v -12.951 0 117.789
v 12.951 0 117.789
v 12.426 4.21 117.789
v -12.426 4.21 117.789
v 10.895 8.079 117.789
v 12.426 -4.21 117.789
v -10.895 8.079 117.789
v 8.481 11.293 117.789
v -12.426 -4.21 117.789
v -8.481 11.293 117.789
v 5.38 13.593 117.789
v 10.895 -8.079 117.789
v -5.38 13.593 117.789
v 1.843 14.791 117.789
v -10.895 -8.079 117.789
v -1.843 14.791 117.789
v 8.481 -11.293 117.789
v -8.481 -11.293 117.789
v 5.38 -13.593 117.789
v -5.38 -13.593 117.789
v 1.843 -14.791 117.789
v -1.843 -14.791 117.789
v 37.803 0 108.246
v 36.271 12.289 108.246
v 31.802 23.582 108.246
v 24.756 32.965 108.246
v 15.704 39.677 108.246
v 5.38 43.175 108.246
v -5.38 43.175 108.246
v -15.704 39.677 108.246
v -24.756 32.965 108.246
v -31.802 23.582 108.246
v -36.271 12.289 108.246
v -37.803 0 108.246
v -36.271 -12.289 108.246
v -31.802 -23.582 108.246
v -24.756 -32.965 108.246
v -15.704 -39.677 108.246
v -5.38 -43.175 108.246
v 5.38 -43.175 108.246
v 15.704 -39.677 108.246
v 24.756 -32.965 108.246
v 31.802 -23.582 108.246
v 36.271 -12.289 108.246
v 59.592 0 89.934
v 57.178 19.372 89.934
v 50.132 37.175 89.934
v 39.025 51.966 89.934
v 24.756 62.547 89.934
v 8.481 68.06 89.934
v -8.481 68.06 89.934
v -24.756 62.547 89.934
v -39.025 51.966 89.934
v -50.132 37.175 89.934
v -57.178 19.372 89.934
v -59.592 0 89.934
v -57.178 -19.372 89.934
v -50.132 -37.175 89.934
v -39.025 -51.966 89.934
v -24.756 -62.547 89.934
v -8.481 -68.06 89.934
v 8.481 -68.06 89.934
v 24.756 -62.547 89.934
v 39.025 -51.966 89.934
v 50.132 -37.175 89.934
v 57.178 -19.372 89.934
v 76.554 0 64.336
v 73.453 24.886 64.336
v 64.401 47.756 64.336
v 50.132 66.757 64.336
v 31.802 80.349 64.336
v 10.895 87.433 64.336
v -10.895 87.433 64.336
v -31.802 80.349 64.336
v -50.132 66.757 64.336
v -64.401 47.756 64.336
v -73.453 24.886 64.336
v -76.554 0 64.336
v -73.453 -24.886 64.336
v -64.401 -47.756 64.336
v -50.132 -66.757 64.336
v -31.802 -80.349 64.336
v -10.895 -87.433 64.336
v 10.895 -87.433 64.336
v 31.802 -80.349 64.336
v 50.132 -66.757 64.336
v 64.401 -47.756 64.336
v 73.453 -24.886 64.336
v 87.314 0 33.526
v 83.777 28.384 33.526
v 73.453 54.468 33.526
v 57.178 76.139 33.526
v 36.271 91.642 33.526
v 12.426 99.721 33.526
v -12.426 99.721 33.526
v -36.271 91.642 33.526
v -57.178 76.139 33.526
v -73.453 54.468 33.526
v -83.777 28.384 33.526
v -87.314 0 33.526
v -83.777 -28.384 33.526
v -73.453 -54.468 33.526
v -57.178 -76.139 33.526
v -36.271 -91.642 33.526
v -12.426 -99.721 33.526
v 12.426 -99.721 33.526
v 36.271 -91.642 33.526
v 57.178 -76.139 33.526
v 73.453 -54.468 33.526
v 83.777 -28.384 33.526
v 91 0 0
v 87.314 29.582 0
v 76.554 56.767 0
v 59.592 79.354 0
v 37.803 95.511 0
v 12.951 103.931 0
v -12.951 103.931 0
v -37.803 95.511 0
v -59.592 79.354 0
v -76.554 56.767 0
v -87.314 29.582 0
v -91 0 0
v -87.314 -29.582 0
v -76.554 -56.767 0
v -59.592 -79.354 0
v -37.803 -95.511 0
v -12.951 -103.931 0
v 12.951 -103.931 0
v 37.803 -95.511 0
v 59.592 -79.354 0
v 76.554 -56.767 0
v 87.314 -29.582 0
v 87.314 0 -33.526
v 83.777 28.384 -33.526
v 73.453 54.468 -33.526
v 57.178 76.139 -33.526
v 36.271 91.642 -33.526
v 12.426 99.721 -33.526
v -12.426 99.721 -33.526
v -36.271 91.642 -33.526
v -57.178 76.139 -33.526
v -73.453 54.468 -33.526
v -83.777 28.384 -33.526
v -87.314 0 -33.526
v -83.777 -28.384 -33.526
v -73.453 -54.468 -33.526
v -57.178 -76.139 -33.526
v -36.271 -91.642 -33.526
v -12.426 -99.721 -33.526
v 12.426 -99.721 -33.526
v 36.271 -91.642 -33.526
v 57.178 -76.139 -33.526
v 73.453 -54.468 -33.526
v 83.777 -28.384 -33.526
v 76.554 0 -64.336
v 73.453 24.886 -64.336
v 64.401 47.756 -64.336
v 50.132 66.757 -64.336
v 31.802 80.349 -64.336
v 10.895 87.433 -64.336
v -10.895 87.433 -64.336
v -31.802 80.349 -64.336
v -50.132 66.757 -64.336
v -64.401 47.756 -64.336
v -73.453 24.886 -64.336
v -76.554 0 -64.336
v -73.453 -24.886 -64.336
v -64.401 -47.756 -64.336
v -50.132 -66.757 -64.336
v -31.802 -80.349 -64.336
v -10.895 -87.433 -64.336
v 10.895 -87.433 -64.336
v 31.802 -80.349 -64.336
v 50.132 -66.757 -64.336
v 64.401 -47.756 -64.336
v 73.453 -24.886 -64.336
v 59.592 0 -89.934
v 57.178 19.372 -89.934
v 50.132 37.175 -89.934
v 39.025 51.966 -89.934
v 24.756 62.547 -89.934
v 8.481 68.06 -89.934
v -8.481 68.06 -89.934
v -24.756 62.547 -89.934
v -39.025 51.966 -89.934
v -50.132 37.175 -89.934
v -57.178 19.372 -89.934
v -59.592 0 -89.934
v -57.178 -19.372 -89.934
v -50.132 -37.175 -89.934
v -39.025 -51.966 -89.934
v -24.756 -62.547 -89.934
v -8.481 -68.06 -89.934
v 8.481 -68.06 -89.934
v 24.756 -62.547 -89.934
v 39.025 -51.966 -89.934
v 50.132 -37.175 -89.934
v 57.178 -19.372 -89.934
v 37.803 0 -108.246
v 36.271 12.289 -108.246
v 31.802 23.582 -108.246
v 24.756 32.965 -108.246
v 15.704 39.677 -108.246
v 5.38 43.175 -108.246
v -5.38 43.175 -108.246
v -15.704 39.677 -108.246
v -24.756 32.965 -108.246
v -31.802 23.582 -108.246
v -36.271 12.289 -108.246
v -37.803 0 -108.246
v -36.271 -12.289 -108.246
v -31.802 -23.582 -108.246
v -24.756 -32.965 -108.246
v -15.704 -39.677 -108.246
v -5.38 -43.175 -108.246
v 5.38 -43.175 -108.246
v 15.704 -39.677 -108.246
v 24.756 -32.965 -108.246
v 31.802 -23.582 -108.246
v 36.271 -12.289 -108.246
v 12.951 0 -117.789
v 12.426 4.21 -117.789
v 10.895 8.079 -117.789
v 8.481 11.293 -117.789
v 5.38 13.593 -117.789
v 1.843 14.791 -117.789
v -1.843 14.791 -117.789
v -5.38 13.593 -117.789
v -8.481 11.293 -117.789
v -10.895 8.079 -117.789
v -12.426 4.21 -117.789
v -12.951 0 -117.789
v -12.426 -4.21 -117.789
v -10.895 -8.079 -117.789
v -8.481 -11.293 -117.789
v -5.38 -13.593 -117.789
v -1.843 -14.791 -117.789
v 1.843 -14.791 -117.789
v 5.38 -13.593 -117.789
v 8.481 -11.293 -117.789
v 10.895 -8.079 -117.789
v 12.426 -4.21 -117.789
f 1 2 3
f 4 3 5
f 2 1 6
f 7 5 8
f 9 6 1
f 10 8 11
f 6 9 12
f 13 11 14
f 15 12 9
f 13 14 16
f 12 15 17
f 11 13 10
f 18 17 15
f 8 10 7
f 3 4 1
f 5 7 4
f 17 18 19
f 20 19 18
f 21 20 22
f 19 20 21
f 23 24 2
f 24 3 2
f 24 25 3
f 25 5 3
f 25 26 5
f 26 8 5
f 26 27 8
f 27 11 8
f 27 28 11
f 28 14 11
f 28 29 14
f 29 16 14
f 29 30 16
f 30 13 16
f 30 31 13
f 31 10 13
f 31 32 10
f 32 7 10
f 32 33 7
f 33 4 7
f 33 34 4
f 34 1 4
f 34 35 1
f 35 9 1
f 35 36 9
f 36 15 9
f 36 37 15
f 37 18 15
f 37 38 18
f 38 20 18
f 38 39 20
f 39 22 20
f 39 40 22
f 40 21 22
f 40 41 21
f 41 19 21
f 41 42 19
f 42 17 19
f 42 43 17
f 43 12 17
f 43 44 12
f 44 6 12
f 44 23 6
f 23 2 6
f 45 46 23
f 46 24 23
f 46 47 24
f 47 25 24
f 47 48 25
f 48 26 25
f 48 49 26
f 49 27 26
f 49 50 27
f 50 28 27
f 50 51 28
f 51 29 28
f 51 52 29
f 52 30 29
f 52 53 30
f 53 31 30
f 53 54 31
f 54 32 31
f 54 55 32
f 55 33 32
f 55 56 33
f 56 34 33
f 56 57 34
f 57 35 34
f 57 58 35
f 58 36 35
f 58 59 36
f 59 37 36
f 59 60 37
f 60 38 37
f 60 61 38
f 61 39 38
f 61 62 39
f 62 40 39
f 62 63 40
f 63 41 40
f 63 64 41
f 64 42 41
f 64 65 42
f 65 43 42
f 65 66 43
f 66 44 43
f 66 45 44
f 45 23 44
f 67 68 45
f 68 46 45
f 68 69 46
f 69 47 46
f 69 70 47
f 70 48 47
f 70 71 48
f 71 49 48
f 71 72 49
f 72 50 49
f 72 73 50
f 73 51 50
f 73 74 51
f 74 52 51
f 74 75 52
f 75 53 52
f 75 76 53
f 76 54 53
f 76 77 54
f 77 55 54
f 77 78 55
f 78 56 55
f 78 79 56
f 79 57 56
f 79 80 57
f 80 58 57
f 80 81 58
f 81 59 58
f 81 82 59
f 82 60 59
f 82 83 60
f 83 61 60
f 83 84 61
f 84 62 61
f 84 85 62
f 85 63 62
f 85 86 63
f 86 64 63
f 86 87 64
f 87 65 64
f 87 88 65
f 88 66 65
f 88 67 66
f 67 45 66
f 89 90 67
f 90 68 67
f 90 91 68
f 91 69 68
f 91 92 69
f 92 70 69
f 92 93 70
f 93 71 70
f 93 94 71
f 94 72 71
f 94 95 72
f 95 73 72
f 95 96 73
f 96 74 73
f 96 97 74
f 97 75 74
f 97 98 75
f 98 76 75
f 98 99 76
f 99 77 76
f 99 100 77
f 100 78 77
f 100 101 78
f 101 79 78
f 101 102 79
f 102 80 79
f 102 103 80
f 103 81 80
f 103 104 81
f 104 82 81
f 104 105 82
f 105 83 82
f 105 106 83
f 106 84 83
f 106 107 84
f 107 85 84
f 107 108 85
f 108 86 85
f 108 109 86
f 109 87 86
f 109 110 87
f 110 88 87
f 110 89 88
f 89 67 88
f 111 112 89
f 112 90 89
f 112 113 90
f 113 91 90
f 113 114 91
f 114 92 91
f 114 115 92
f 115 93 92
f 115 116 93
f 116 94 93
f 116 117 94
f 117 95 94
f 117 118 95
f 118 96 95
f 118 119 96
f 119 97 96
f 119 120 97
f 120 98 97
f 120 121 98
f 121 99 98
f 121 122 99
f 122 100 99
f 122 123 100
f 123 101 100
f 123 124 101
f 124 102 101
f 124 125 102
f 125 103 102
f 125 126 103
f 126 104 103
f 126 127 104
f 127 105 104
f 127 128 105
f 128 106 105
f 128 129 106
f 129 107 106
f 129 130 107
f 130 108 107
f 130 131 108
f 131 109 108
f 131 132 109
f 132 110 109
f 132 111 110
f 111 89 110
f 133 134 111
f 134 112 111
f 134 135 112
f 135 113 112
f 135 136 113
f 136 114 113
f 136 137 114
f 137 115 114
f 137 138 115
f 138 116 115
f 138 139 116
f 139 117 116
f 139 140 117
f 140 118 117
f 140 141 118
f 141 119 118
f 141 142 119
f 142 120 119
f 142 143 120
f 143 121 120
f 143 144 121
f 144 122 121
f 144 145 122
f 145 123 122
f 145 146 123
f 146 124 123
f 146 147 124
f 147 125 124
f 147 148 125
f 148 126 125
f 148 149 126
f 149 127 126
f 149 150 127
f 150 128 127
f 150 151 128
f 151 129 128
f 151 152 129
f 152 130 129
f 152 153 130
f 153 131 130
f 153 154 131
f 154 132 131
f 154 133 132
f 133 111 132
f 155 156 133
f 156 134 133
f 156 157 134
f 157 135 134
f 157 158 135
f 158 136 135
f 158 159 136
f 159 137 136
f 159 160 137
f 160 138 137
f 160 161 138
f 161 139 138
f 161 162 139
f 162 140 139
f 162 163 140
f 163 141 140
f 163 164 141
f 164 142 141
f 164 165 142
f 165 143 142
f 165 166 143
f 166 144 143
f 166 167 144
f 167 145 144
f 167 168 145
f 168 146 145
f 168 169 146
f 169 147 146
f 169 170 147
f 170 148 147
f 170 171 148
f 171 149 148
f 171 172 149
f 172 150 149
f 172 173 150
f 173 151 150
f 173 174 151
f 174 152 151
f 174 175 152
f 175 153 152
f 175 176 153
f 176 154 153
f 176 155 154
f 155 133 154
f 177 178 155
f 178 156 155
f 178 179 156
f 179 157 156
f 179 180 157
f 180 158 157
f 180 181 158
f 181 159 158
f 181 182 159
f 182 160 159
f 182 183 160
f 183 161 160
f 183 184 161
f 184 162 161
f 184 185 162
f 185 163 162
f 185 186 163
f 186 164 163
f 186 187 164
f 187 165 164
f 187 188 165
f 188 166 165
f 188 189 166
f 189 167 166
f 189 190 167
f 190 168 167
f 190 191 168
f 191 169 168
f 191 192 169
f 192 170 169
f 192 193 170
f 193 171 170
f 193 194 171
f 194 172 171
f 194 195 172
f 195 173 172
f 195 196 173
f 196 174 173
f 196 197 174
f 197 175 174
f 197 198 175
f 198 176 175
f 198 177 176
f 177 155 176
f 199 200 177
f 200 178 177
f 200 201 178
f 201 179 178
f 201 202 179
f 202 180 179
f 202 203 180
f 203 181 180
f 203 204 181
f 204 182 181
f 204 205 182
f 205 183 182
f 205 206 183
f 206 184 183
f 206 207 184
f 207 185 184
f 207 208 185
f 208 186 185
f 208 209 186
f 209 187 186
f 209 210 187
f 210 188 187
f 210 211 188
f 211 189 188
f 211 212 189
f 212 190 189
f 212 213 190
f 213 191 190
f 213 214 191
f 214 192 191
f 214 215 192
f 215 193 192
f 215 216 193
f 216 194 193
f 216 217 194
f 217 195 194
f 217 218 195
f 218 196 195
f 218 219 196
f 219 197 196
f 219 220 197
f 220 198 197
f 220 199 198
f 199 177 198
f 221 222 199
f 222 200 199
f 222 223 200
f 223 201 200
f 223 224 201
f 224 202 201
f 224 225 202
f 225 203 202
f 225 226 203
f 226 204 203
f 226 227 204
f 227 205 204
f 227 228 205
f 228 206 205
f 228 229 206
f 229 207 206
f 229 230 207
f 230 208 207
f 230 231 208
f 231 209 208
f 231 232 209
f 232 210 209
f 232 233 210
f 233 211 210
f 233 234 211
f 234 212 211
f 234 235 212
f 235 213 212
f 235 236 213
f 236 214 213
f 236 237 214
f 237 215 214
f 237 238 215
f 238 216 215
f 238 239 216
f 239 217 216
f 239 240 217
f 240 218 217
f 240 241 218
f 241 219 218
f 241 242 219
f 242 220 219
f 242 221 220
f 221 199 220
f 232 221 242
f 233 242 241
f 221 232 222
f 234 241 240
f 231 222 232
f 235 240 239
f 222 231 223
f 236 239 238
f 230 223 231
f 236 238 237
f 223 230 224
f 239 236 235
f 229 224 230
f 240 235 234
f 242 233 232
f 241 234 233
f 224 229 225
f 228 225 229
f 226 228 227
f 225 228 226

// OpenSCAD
// Generated by SolidPython 1.0.1 on 2020-07-29 00:46:51


scale(v = [13, 15, 17]) {
	sphere(r = 7);
}
/***********************************************
*********      SolidPython code:      **********
************************************************
 
# import packages: SolidPython
from solid import *
from solid.utils import *
from itertools import chain, combinations, permutations


class Resize:

    def __init__(self, scad_file):
        self.scad_file = scad_file
        #self.scad_file = import_scad(scad_file)
        # cone/cylinder param:
        self.r1 = 0
        self.r2 = 0
        self.h = 0
        # rectangular prism param:
        self.w = 0
        self.l = 0
        # ellipse param:
        self.r = 0

    # import OpenScad code (file name corresponds to shape)


    # classify shape + parameters
    def assign(self, param1, param2, param3):
        if self.scad_file == 'cone.scad':
            self.r1 = param1
            self.r2 = param2
            self.h = param3
        elif self.scad_file == 'cylinder.scad':
            self.r1 = param1
            self.r2 = param2
            self.h = param3
        elif self.scad_file == 'rectangularPrism.scad':
            self.h = param1
            self.l = param2
            self.w = param3
        else:
            self.r = param1
            self.h = param2

    # resize parameters
    def iterate(self):
        x = range(3, 20, 2)
        i = 1
        if self.scad_file == 'cone.scad':
            tempList = list(permutations(x, 2))
            for temp in tempList:
                param1 = temp[0]
                param2 = temp[1]
                filepath = 'produced_scad_files/' + 'cone' + str(param1) + '_' + str(param2) + '_' + '.scad'
                scad_render_to_file(cylinder(h=param1, r1=param2, r2=0), filepath)

        elif self.scad_file == 'cylinder.scad':
            tempList = list(permutations(x, 3))
            for temp in tempList:
                param1 = temp[0]
                param2 = temp[1]
                filepath = 'produced_scad_files/' + 'cylinder' + str(param1) + '_' + str(param2) + '_' + '.scad'
                scad_render_to_file(cylinder(h=param1, r1=param2, r2=param2), filepath)

        elif self.scad_file == 'rectangularPrism.scad':
            tempList = list(permutations(x, 3))
            for temp in tempList:
                param1 = temp[0]
                param2 = temp[1]
                param3 = temp[2]
                filepath = 'produced_scad_files/' + 'rectangularPrism' + str(param1) + '_' + str(param2) + '_' + str(
                    param3) + '.scad'
                scad_render_to_file(cube(size=(param1, param2, param3)), filepath)

        elif self.scad_file == 'ellipse.scad':
            tempList = list(permutations(x, 4))
            for temp in tempList:
                param1 = temp[0]
                param2 = temp[1]
                param3 = temp[2]
                param4 = temp[3]
                filepath = 'produced_scad_files/' + 'ellipse' + str(param1) + '_' + str(param2) + '_' + str(param3) + '_' + str(param4) + '.scad'
                scad_render_to_file(scale([param1, param2, param3])(sphere(r=param4)), filepath)

    def render_to_scadfile(self):
        scad_render_to_file(scad, 'example.scad') 
 
************************************************/
